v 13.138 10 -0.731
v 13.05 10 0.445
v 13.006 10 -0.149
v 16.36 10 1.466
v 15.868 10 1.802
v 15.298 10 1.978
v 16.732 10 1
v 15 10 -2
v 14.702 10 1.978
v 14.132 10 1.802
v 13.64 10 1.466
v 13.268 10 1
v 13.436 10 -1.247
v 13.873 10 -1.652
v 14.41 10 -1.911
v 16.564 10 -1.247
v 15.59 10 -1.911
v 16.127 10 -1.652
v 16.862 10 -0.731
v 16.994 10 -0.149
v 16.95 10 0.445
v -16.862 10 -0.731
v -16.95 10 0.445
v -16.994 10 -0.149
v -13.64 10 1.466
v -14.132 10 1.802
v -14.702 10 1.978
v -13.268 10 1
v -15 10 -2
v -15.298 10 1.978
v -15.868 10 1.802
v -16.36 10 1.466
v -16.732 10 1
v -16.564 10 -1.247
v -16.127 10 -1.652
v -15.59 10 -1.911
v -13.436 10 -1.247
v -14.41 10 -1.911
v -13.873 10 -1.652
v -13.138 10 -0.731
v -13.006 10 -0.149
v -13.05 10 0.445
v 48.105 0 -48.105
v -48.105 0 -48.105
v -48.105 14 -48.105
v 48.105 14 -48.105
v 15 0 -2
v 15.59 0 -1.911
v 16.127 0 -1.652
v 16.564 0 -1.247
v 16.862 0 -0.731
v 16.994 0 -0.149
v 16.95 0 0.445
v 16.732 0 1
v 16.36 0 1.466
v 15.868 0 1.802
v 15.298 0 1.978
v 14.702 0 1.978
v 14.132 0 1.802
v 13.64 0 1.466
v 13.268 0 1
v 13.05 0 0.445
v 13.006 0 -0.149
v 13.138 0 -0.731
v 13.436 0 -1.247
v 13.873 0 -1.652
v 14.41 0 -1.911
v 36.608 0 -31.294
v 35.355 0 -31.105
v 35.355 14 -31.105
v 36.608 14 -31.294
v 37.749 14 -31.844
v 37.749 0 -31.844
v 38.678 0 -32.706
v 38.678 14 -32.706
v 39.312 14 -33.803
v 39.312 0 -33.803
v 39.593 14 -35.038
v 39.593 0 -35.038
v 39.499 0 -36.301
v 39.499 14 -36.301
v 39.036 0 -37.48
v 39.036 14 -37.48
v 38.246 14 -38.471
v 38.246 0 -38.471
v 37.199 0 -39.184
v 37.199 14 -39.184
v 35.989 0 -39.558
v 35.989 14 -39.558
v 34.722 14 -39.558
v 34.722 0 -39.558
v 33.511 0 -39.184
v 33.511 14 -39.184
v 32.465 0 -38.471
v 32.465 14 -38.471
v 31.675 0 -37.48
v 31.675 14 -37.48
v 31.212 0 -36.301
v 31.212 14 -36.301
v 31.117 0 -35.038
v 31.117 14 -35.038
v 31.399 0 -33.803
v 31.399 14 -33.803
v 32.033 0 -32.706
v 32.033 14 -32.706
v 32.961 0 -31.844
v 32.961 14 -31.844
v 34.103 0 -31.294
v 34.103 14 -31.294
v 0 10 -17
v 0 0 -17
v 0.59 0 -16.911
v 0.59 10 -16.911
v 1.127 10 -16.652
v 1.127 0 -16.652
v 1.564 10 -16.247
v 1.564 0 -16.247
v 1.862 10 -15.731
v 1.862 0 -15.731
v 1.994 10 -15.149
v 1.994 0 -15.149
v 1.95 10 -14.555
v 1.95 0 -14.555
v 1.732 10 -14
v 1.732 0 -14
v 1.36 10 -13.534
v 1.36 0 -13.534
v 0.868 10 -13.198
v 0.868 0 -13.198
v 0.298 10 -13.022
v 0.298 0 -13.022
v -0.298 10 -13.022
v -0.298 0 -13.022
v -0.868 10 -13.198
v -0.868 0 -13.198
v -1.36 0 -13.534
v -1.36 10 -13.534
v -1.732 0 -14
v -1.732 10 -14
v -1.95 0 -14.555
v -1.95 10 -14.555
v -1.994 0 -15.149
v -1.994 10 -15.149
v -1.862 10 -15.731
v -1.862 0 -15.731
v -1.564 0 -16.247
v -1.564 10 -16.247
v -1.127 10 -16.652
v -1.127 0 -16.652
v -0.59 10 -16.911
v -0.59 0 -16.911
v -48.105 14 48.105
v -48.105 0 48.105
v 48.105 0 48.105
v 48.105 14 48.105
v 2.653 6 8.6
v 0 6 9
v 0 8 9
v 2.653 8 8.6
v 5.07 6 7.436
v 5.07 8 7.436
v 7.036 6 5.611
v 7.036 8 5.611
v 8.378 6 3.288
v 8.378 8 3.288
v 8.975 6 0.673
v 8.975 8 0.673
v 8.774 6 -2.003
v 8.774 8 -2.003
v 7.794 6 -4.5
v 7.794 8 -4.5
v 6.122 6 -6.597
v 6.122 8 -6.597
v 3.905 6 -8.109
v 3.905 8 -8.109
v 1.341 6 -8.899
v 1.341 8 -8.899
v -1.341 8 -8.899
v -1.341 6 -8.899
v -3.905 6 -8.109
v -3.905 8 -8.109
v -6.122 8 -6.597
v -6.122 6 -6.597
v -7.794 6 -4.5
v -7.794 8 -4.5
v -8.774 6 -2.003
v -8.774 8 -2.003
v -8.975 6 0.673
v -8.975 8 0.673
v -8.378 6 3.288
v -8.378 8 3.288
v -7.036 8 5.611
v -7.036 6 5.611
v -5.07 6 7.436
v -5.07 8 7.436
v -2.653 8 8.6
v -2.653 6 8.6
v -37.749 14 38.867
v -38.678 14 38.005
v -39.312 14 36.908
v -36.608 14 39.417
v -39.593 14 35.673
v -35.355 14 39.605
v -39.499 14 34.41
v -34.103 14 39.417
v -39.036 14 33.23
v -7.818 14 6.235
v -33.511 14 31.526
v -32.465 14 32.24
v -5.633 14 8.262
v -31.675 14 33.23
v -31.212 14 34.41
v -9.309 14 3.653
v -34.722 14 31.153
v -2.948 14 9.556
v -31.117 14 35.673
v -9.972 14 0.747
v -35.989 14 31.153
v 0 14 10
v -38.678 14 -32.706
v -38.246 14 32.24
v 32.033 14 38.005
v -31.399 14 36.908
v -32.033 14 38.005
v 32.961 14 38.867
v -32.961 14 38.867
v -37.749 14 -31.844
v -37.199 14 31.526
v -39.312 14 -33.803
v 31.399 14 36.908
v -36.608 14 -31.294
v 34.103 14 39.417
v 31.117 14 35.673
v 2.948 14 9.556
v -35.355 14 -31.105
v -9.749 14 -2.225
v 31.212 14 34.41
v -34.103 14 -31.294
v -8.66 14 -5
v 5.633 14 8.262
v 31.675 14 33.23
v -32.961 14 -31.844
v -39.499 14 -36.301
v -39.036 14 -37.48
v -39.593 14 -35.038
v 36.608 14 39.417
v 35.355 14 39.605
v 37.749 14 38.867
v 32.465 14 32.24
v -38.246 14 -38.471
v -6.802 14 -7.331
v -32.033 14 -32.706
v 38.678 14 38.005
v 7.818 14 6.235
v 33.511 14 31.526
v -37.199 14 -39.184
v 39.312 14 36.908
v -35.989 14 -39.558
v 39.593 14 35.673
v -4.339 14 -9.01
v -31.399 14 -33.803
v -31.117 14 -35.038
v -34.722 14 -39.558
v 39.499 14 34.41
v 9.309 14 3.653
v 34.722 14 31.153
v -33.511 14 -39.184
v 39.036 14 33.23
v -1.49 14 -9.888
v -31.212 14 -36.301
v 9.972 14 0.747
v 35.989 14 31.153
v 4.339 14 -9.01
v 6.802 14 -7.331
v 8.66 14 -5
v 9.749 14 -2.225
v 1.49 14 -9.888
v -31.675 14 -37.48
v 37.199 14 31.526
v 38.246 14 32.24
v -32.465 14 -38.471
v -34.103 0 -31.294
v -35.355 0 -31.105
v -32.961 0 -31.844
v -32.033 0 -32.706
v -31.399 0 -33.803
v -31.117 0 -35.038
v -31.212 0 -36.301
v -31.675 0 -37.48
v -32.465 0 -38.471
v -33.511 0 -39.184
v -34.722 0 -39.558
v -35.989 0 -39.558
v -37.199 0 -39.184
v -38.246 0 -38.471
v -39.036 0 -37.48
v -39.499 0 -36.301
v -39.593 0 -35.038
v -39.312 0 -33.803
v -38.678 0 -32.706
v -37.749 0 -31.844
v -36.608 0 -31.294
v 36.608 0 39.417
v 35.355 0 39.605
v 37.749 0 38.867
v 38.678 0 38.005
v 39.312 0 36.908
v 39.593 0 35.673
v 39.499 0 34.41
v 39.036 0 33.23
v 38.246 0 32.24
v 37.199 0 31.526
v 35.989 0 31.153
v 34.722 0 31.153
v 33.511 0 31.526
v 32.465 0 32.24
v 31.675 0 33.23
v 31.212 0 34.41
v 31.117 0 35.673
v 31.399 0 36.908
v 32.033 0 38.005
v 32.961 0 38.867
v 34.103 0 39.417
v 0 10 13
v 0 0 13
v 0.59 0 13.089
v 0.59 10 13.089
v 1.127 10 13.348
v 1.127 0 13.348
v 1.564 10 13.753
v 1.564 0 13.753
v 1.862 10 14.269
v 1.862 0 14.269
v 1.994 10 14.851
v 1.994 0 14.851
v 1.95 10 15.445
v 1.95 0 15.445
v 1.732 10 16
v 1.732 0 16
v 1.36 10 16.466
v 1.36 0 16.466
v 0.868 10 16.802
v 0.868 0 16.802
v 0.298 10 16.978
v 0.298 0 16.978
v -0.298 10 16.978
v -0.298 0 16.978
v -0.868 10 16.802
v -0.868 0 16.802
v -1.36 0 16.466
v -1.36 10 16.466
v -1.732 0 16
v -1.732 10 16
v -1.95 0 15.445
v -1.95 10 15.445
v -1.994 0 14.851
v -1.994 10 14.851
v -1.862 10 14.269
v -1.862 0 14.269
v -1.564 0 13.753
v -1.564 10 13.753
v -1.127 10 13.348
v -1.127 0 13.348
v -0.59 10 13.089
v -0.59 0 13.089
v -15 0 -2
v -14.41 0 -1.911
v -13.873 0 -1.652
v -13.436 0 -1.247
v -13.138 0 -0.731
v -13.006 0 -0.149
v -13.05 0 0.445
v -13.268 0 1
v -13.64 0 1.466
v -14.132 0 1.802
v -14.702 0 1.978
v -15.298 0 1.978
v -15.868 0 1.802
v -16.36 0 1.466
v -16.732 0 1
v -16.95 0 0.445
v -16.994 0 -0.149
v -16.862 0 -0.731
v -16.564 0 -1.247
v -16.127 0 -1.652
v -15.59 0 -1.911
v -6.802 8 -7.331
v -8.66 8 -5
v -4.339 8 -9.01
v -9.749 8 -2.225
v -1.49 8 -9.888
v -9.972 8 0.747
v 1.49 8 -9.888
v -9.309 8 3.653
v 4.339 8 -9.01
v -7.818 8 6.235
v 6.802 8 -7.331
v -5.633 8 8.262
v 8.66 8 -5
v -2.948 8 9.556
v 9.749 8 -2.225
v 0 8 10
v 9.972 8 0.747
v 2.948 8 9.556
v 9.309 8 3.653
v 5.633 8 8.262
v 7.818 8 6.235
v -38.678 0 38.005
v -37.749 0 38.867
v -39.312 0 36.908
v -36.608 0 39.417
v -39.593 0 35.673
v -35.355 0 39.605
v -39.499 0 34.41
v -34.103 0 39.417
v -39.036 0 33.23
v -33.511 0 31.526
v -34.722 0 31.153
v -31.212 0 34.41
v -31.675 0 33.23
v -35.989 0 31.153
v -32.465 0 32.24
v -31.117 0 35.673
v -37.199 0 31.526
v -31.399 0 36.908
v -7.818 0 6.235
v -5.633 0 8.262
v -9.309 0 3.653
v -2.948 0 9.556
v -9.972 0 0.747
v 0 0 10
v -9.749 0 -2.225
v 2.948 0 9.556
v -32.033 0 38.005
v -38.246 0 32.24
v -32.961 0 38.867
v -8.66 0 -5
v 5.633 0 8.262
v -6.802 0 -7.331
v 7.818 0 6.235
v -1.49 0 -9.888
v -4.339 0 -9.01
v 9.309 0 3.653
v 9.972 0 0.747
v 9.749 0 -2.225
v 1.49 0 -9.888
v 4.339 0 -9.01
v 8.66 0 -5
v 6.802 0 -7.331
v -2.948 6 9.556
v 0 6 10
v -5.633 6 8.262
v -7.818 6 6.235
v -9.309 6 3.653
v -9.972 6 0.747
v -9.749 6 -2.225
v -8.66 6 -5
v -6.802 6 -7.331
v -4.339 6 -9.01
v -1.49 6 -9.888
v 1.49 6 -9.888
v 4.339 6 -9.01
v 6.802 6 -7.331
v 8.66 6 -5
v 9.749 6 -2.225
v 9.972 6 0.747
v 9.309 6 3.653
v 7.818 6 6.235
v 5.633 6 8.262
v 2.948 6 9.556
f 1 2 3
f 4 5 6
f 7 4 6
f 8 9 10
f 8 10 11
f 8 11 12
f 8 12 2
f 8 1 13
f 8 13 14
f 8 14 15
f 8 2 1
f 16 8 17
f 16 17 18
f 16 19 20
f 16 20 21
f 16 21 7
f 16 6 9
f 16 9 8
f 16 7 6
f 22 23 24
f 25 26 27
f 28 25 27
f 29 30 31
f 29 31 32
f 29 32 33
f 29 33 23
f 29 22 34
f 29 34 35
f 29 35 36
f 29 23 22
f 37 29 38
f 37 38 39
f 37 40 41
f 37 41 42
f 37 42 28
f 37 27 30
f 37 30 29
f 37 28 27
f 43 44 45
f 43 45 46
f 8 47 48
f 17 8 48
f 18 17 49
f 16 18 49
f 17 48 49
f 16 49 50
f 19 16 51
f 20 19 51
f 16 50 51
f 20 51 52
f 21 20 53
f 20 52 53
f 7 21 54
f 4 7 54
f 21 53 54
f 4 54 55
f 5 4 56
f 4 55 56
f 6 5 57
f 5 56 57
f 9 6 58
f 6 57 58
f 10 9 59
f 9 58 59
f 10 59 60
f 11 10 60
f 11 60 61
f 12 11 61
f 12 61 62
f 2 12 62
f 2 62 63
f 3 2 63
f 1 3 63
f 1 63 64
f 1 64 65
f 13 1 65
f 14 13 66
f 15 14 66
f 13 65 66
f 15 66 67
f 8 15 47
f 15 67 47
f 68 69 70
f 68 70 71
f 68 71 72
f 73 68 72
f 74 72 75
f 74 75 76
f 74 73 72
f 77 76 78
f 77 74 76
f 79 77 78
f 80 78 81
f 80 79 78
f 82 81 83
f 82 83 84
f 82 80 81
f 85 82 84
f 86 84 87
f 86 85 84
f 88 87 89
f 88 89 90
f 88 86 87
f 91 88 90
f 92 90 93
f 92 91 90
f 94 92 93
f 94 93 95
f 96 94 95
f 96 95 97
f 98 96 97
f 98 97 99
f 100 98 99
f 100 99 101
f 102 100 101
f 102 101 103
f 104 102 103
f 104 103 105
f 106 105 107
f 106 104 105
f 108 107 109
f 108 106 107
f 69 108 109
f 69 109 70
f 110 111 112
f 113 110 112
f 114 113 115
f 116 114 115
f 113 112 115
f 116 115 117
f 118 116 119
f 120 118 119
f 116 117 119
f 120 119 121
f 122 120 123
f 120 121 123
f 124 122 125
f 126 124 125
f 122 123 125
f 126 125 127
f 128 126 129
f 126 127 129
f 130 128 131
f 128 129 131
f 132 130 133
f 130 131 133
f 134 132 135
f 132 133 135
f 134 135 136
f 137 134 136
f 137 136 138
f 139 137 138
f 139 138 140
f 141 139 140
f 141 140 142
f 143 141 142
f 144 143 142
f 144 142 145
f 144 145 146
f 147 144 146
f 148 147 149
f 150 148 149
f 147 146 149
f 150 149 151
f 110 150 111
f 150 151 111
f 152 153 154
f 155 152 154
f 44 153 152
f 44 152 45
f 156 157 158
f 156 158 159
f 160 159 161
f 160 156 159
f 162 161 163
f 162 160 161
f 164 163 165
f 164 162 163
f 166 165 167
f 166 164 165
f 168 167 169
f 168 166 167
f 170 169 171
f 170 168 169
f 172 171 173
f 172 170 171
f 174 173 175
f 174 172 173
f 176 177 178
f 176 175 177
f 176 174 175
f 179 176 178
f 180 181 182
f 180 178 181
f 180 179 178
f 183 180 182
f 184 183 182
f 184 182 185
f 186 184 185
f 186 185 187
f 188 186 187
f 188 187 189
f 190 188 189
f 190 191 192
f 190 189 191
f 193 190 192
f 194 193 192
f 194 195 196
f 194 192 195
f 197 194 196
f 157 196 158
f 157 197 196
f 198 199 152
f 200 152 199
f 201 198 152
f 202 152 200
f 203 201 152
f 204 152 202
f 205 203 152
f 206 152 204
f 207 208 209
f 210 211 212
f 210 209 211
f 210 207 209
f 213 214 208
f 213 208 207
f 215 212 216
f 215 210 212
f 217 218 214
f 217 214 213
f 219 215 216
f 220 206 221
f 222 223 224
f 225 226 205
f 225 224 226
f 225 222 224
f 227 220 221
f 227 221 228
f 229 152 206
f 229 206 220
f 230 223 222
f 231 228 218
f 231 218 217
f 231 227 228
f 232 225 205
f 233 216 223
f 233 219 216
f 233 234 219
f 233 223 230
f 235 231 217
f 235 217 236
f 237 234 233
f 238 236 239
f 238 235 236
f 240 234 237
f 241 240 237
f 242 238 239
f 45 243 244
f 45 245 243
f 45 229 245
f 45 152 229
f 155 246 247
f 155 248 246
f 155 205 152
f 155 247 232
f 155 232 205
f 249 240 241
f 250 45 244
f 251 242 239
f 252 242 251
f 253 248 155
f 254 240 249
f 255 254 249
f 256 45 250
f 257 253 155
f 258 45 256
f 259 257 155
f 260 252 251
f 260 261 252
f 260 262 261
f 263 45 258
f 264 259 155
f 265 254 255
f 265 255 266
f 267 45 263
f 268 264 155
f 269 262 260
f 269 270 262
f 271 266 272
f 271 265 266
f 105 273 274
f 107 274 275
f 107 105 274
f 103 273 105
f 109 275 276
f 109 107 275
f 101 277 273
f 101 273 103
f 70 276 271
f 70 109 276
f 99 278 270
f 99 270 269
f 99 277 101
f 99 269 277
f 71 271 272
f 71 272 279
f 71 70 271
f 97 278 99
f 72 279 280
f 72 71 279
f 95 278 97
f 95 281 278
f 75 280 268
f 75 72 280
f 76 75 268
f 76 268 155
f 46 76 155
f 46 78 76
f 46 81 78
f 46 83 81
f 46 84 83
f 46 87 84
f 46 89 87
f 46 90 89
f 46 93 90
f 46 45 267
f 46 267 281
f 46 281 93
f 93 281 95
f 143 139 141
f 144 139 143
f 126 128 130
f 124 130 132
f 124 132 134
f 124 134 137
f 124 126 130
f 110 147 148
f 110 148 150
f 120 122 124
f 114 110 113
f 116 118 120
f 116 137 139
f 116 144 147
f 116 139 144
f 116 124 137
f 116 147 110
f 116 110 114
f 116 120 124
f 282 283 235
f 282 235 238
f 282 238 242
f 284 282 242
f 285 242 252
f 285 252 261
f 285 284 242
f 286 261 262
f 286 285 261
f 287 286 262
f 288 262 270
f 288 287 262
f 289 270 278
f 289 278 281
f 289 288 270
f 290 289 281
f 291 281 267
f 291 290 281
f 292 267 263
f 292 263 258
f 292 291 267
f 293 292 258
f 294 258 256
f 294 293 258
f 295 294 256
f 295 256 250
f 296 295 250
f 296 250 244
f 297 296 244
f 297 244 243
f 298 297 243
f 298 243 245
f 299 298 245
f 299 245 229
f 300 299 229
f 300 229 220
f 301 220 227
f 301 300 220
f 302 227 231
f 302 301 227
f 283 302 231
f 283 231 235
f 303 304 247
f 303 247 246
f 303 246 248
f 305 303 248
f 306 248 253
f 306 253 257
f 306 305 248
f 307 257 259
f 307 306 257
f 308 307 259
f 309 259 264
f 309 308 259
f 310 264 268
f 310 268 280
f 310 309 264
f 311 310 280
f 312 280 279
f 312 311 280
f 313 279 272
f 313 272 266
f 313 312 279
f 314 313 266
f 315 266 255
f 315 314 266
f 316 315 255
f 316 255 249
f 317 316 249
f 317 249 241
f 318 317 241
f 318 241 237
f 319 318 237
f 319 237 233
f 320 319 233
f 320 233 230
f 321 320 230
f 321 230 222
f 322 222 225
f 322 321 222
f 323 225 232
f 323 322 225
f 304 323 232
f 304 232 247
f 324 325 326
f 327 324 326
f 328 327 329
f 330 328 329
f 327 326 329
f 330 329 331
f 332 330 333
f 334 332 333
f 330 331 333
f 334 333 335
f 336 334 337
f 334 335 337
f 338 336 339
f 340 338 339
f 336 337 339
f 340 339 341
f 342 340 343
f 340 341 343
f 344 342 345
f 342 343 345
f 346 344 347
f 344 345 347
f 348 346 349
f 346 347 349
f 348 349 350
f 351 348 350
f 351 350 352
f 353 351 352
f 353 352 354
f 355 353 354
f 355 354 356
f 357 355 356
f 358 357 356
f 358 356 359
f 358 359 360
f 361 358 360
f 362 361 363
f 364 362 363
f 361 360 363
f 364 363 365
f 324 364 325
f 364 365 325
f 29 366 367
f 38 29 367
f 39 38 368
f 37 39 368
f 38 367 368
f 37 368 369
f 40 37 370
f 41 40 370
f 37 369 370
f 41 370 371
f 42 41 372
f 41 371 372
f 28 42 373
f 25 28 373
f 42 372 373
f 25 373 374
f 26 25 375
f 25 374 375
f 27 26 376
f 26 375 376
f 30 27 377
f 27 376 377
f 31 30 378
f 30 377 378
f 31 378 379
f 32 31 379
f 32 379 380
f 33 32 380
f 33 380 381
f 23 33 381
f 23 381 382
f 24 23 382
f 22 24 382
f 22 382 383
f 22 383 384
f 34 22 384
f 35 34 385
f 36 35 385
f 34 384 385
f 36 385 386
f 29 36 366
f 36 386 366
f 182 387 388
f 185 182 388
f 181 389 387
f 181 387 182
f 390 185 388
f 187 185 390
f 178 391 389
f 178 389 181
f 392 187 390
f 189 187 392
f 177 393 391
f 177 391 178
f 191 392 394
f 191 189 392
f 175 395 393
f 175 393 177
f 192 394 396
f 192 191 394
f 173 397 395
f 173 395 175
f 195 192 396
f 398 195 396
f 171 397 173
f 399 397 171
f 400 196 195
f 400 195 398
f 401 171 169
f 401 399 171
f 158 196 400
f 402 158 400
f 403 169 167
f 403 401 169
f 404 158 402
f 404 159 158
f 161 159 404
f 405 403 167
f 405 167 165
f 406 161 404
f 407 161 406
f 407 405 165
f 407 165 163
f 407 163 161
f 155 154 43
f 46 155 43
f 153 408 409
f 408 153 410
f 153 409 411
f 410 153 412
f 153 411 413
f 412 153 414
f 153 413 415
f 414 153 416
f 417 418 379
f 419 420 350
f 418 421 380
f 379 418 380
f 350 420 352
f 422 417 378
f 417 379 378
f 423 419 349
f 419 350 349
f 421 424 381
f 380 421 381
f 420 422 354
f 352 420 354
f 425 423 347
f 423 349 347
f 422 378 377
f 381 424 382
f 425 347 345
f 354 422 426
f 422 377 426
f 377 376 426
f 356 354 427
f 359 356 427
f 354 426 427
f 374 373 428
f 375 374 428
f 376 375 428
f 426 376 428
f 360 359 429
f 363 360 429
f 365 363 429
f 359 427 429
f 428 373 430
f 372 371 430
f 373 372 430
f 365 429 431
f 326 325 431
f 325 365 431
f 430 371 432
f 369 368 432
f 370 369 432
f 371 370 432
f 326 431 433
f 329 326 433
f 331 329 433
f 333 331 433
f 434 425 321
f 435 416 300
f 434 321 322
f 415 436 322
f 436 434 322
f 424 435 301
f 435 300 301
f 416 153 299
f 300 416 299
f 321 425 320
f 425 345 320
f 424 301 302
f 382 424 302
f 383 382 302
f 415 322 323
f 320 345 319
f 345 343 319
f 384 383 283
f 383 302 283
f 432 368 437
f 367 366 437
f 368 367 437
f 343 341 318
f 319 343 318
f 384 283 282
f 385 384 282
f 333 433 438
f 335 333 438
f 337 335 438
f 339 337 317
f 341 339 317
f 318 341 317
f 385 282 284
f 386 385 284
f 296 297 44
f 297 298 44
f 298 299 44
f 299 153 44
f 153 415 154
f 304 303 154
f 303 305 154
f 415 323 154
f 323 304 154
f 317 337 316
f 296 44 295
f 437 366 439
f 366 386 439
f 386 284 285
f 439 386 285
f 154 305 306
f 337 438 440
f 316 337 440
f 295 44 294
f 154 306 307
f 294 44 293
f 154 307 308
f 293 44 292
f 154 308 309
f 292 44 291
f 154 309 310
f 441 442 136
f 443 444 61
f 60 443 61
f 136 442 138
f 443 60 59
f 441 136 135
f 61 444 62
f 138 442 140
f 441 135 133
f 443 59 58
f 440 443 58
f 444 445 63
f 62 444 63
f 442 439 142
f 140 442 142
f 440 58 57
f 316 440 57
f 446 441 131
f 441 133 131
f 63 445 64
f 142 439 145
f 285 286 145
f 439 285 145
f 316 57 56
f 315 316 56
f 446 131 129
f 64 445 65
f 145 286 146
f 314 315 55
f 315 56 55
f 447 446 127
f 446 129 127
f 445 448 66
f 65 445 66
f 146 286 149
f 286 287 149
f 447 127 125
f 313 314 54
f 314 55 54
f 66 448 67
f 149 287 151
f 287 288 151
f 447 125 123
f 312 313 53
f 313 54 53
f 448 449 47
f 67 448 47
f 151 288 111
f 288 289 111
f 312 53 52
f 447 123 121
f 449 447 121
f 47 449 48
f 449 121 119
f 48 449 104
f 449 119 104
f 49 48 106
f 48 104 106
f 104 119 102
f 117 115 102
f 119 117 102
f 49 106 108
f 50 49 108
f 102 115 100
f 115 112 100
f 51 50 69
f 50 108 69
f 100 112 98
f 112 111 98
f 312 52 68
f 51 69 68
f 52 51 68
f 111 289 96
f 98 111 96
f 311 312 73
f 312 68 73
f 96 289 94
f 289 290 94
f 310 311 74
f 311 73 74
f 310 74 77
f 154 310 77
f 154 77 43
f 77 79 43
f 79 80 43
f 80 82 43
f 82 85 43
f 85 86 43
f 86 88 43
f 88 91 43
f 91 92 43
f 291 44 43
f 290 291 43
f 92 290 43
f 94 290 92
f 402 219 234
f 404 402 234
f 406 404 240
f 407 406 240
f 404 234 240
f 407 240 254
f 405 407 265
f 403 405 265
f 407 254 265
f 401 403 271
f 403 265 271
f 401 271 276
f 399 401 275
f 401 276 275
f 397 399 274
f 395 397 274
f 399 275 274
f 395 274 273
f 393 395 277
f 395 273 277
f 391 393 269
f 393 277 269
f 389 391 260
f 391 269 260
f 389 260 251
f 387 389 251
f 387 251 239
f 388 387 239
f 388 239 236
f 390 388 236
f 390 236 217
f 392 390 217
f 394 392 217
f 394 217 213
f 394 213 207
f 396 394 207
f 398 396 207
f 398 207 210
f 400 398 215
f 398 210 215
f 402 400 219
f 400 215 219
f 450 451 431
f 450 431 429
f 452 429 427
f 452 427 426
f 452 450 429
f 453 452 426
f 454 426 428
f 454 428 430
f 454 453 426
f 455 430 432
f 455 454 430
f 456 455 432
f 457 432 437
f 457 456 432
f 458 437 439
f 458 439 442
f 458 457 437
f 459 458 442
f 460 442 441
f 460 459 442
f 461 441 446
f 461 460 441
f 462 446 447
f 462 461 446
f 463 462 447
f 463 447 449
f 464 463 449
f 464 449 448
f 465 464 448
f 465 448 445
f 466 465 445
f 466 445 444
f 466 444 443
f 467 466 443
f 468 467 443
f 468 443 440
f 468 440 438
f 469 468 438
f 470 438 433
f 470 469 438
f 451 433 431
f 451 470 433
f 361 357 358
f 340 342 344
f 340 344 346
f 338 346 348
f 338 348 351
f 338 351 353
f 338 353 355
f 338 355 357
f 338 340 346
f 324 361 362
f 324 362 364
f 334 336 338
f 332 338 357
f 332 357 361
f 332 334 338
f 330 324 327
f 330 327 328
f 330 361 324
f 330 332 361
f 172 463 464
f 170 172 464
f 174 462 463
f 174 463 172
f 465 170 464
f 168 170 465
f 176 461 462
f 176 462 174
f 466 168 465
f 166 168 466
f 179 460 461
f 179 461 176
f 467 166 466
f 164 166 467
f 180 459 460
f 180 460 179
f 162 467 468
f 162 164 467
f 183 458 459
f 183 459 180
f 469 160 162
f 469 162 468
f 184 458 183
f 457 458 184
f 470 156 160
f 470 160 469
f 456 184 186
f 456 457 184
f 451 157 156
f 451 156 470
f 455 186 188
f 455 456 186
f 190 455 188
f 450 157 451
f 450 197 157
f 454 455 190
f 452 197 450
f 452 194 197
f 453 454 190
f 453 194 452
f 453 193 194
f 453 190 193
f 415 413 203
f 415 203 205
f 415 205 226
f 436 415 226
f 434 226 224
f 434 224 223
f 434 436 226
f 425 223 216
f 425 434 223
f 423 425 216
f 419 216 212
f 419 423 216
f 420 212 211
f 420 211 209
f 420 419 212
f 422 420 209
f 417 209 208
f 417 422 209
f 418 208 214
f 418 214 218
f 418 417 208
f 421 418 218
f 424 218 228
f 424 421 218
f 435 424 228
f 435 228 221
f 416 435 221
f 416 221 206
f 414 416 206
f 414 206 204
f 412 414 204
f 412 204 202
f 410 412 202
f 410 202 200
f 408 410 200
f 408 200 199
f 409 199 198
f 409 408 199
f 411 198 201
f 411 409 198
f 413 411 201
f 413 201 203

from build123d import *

# Parameters (mm, degrees)
SKETCH1_W                 = 96.210678118
SKETCH1_H                 = 96.210678118
SKETCH1_R                 = 4.25
SKETCH1_R_2               = 9
BODY_AND_MAIN_HOLES_DEPTH = 14
SKETCH2_R                 = 10
SEAL_HOLE_DEPTH           = 6
BEARING_START             = -6
SKETCH3_R                 = 10
BEARING_HOLE_DEPTH        = 6
SKETCH4_R                 = 2
CUT_EXTRUDE1_DEPTH        = 10


with BuildPart() as part:
    # Sketch1 → body and main holes (new body)
    with BuildSketch(Plane(origin=(0, 0, 0), x_dir=(1, 0, 0), z_dir=(0, 1, 0))):
        Rectangle(SKETCH1_W, SKETCH1_H)
        with Locations(Location((-35.355339059, 35.355339059, 0), (0, 0, 270))):
            Circle(SKETCH1_R, mode=Mode.SUBTRACT)
        with Locations(Location((35.355339059, 35.355339059, 0), (0, 0, 270))):
            Circle(SKETCH1_R, mode=Mode.SUBTRACT)
        with Locations(Location((35.355339059, -35.355339059, 0), (0, 0, 270))):
            Circle(SKETCH1_R, mode=Mode.SUBTRACT)
        with Locations(Location((-35.355339059, -35.355339059, 0), (0, 0, 270))):
            Circle(SKETCH1_R, mode=Mode.SUBTRACT)
        with Locations(Location((0, 0, 0), (0, 0, 270))):
            Circle(SKETCH1_R_2, mode=Mode.SUBTRACT)
    extrude(amount=BODY_AND_MAIN_HOLES_DEPTH)

    # Sketch2 → seal hole (cut)
    with BuildSketch(Plane(origin=(0, 14, 0), x_dir=(1, 0, 0), z_dir=(0, 1, 0))):
        with Locations(Location((0, 0, 0), (0, 0, 270))):
            Circle(SKETCH2_R)
    extrude(amount=-SEAL_HOLE_DEPTH, mode=Mode.SUBTRACT)

    # Sketch3 → bearing hole (cut)
    with BuildSketch(Plane.XZ.offset(BEARING_START)):
        with Locations(Location((0, 0, 0), (0, 0, 90))):
            Circle(SKETCH3_R)
    extrude(amount=BEARING_HOLE_DEPTH, mode=Mode.SUBTRACT)

    # Sketch4 → Cut-Extrude1 (cut)
    with BuildSketch(Plane.XZ):
        with Locations(Location((0, -15, 0), (0, 0, 270))):
            Circle(SKETCH4_R)
        with Locations(Location((-15, 0, 0), (0, 0, 270))):
            Circle(SKETCH4_R)
        with Locations(Location((0, 15, 0), (0, 0, 270))):
            Circle(SKETCH4_R)
        with Locations(Location((15, 0, 0), (0, 0, 270))):
            Circle(SKETCH4_R)
    extrude(amount=-CUT_EXTRUDE1_DEPTH, mode=Mode.SUBTRACT)


solid = part.part
